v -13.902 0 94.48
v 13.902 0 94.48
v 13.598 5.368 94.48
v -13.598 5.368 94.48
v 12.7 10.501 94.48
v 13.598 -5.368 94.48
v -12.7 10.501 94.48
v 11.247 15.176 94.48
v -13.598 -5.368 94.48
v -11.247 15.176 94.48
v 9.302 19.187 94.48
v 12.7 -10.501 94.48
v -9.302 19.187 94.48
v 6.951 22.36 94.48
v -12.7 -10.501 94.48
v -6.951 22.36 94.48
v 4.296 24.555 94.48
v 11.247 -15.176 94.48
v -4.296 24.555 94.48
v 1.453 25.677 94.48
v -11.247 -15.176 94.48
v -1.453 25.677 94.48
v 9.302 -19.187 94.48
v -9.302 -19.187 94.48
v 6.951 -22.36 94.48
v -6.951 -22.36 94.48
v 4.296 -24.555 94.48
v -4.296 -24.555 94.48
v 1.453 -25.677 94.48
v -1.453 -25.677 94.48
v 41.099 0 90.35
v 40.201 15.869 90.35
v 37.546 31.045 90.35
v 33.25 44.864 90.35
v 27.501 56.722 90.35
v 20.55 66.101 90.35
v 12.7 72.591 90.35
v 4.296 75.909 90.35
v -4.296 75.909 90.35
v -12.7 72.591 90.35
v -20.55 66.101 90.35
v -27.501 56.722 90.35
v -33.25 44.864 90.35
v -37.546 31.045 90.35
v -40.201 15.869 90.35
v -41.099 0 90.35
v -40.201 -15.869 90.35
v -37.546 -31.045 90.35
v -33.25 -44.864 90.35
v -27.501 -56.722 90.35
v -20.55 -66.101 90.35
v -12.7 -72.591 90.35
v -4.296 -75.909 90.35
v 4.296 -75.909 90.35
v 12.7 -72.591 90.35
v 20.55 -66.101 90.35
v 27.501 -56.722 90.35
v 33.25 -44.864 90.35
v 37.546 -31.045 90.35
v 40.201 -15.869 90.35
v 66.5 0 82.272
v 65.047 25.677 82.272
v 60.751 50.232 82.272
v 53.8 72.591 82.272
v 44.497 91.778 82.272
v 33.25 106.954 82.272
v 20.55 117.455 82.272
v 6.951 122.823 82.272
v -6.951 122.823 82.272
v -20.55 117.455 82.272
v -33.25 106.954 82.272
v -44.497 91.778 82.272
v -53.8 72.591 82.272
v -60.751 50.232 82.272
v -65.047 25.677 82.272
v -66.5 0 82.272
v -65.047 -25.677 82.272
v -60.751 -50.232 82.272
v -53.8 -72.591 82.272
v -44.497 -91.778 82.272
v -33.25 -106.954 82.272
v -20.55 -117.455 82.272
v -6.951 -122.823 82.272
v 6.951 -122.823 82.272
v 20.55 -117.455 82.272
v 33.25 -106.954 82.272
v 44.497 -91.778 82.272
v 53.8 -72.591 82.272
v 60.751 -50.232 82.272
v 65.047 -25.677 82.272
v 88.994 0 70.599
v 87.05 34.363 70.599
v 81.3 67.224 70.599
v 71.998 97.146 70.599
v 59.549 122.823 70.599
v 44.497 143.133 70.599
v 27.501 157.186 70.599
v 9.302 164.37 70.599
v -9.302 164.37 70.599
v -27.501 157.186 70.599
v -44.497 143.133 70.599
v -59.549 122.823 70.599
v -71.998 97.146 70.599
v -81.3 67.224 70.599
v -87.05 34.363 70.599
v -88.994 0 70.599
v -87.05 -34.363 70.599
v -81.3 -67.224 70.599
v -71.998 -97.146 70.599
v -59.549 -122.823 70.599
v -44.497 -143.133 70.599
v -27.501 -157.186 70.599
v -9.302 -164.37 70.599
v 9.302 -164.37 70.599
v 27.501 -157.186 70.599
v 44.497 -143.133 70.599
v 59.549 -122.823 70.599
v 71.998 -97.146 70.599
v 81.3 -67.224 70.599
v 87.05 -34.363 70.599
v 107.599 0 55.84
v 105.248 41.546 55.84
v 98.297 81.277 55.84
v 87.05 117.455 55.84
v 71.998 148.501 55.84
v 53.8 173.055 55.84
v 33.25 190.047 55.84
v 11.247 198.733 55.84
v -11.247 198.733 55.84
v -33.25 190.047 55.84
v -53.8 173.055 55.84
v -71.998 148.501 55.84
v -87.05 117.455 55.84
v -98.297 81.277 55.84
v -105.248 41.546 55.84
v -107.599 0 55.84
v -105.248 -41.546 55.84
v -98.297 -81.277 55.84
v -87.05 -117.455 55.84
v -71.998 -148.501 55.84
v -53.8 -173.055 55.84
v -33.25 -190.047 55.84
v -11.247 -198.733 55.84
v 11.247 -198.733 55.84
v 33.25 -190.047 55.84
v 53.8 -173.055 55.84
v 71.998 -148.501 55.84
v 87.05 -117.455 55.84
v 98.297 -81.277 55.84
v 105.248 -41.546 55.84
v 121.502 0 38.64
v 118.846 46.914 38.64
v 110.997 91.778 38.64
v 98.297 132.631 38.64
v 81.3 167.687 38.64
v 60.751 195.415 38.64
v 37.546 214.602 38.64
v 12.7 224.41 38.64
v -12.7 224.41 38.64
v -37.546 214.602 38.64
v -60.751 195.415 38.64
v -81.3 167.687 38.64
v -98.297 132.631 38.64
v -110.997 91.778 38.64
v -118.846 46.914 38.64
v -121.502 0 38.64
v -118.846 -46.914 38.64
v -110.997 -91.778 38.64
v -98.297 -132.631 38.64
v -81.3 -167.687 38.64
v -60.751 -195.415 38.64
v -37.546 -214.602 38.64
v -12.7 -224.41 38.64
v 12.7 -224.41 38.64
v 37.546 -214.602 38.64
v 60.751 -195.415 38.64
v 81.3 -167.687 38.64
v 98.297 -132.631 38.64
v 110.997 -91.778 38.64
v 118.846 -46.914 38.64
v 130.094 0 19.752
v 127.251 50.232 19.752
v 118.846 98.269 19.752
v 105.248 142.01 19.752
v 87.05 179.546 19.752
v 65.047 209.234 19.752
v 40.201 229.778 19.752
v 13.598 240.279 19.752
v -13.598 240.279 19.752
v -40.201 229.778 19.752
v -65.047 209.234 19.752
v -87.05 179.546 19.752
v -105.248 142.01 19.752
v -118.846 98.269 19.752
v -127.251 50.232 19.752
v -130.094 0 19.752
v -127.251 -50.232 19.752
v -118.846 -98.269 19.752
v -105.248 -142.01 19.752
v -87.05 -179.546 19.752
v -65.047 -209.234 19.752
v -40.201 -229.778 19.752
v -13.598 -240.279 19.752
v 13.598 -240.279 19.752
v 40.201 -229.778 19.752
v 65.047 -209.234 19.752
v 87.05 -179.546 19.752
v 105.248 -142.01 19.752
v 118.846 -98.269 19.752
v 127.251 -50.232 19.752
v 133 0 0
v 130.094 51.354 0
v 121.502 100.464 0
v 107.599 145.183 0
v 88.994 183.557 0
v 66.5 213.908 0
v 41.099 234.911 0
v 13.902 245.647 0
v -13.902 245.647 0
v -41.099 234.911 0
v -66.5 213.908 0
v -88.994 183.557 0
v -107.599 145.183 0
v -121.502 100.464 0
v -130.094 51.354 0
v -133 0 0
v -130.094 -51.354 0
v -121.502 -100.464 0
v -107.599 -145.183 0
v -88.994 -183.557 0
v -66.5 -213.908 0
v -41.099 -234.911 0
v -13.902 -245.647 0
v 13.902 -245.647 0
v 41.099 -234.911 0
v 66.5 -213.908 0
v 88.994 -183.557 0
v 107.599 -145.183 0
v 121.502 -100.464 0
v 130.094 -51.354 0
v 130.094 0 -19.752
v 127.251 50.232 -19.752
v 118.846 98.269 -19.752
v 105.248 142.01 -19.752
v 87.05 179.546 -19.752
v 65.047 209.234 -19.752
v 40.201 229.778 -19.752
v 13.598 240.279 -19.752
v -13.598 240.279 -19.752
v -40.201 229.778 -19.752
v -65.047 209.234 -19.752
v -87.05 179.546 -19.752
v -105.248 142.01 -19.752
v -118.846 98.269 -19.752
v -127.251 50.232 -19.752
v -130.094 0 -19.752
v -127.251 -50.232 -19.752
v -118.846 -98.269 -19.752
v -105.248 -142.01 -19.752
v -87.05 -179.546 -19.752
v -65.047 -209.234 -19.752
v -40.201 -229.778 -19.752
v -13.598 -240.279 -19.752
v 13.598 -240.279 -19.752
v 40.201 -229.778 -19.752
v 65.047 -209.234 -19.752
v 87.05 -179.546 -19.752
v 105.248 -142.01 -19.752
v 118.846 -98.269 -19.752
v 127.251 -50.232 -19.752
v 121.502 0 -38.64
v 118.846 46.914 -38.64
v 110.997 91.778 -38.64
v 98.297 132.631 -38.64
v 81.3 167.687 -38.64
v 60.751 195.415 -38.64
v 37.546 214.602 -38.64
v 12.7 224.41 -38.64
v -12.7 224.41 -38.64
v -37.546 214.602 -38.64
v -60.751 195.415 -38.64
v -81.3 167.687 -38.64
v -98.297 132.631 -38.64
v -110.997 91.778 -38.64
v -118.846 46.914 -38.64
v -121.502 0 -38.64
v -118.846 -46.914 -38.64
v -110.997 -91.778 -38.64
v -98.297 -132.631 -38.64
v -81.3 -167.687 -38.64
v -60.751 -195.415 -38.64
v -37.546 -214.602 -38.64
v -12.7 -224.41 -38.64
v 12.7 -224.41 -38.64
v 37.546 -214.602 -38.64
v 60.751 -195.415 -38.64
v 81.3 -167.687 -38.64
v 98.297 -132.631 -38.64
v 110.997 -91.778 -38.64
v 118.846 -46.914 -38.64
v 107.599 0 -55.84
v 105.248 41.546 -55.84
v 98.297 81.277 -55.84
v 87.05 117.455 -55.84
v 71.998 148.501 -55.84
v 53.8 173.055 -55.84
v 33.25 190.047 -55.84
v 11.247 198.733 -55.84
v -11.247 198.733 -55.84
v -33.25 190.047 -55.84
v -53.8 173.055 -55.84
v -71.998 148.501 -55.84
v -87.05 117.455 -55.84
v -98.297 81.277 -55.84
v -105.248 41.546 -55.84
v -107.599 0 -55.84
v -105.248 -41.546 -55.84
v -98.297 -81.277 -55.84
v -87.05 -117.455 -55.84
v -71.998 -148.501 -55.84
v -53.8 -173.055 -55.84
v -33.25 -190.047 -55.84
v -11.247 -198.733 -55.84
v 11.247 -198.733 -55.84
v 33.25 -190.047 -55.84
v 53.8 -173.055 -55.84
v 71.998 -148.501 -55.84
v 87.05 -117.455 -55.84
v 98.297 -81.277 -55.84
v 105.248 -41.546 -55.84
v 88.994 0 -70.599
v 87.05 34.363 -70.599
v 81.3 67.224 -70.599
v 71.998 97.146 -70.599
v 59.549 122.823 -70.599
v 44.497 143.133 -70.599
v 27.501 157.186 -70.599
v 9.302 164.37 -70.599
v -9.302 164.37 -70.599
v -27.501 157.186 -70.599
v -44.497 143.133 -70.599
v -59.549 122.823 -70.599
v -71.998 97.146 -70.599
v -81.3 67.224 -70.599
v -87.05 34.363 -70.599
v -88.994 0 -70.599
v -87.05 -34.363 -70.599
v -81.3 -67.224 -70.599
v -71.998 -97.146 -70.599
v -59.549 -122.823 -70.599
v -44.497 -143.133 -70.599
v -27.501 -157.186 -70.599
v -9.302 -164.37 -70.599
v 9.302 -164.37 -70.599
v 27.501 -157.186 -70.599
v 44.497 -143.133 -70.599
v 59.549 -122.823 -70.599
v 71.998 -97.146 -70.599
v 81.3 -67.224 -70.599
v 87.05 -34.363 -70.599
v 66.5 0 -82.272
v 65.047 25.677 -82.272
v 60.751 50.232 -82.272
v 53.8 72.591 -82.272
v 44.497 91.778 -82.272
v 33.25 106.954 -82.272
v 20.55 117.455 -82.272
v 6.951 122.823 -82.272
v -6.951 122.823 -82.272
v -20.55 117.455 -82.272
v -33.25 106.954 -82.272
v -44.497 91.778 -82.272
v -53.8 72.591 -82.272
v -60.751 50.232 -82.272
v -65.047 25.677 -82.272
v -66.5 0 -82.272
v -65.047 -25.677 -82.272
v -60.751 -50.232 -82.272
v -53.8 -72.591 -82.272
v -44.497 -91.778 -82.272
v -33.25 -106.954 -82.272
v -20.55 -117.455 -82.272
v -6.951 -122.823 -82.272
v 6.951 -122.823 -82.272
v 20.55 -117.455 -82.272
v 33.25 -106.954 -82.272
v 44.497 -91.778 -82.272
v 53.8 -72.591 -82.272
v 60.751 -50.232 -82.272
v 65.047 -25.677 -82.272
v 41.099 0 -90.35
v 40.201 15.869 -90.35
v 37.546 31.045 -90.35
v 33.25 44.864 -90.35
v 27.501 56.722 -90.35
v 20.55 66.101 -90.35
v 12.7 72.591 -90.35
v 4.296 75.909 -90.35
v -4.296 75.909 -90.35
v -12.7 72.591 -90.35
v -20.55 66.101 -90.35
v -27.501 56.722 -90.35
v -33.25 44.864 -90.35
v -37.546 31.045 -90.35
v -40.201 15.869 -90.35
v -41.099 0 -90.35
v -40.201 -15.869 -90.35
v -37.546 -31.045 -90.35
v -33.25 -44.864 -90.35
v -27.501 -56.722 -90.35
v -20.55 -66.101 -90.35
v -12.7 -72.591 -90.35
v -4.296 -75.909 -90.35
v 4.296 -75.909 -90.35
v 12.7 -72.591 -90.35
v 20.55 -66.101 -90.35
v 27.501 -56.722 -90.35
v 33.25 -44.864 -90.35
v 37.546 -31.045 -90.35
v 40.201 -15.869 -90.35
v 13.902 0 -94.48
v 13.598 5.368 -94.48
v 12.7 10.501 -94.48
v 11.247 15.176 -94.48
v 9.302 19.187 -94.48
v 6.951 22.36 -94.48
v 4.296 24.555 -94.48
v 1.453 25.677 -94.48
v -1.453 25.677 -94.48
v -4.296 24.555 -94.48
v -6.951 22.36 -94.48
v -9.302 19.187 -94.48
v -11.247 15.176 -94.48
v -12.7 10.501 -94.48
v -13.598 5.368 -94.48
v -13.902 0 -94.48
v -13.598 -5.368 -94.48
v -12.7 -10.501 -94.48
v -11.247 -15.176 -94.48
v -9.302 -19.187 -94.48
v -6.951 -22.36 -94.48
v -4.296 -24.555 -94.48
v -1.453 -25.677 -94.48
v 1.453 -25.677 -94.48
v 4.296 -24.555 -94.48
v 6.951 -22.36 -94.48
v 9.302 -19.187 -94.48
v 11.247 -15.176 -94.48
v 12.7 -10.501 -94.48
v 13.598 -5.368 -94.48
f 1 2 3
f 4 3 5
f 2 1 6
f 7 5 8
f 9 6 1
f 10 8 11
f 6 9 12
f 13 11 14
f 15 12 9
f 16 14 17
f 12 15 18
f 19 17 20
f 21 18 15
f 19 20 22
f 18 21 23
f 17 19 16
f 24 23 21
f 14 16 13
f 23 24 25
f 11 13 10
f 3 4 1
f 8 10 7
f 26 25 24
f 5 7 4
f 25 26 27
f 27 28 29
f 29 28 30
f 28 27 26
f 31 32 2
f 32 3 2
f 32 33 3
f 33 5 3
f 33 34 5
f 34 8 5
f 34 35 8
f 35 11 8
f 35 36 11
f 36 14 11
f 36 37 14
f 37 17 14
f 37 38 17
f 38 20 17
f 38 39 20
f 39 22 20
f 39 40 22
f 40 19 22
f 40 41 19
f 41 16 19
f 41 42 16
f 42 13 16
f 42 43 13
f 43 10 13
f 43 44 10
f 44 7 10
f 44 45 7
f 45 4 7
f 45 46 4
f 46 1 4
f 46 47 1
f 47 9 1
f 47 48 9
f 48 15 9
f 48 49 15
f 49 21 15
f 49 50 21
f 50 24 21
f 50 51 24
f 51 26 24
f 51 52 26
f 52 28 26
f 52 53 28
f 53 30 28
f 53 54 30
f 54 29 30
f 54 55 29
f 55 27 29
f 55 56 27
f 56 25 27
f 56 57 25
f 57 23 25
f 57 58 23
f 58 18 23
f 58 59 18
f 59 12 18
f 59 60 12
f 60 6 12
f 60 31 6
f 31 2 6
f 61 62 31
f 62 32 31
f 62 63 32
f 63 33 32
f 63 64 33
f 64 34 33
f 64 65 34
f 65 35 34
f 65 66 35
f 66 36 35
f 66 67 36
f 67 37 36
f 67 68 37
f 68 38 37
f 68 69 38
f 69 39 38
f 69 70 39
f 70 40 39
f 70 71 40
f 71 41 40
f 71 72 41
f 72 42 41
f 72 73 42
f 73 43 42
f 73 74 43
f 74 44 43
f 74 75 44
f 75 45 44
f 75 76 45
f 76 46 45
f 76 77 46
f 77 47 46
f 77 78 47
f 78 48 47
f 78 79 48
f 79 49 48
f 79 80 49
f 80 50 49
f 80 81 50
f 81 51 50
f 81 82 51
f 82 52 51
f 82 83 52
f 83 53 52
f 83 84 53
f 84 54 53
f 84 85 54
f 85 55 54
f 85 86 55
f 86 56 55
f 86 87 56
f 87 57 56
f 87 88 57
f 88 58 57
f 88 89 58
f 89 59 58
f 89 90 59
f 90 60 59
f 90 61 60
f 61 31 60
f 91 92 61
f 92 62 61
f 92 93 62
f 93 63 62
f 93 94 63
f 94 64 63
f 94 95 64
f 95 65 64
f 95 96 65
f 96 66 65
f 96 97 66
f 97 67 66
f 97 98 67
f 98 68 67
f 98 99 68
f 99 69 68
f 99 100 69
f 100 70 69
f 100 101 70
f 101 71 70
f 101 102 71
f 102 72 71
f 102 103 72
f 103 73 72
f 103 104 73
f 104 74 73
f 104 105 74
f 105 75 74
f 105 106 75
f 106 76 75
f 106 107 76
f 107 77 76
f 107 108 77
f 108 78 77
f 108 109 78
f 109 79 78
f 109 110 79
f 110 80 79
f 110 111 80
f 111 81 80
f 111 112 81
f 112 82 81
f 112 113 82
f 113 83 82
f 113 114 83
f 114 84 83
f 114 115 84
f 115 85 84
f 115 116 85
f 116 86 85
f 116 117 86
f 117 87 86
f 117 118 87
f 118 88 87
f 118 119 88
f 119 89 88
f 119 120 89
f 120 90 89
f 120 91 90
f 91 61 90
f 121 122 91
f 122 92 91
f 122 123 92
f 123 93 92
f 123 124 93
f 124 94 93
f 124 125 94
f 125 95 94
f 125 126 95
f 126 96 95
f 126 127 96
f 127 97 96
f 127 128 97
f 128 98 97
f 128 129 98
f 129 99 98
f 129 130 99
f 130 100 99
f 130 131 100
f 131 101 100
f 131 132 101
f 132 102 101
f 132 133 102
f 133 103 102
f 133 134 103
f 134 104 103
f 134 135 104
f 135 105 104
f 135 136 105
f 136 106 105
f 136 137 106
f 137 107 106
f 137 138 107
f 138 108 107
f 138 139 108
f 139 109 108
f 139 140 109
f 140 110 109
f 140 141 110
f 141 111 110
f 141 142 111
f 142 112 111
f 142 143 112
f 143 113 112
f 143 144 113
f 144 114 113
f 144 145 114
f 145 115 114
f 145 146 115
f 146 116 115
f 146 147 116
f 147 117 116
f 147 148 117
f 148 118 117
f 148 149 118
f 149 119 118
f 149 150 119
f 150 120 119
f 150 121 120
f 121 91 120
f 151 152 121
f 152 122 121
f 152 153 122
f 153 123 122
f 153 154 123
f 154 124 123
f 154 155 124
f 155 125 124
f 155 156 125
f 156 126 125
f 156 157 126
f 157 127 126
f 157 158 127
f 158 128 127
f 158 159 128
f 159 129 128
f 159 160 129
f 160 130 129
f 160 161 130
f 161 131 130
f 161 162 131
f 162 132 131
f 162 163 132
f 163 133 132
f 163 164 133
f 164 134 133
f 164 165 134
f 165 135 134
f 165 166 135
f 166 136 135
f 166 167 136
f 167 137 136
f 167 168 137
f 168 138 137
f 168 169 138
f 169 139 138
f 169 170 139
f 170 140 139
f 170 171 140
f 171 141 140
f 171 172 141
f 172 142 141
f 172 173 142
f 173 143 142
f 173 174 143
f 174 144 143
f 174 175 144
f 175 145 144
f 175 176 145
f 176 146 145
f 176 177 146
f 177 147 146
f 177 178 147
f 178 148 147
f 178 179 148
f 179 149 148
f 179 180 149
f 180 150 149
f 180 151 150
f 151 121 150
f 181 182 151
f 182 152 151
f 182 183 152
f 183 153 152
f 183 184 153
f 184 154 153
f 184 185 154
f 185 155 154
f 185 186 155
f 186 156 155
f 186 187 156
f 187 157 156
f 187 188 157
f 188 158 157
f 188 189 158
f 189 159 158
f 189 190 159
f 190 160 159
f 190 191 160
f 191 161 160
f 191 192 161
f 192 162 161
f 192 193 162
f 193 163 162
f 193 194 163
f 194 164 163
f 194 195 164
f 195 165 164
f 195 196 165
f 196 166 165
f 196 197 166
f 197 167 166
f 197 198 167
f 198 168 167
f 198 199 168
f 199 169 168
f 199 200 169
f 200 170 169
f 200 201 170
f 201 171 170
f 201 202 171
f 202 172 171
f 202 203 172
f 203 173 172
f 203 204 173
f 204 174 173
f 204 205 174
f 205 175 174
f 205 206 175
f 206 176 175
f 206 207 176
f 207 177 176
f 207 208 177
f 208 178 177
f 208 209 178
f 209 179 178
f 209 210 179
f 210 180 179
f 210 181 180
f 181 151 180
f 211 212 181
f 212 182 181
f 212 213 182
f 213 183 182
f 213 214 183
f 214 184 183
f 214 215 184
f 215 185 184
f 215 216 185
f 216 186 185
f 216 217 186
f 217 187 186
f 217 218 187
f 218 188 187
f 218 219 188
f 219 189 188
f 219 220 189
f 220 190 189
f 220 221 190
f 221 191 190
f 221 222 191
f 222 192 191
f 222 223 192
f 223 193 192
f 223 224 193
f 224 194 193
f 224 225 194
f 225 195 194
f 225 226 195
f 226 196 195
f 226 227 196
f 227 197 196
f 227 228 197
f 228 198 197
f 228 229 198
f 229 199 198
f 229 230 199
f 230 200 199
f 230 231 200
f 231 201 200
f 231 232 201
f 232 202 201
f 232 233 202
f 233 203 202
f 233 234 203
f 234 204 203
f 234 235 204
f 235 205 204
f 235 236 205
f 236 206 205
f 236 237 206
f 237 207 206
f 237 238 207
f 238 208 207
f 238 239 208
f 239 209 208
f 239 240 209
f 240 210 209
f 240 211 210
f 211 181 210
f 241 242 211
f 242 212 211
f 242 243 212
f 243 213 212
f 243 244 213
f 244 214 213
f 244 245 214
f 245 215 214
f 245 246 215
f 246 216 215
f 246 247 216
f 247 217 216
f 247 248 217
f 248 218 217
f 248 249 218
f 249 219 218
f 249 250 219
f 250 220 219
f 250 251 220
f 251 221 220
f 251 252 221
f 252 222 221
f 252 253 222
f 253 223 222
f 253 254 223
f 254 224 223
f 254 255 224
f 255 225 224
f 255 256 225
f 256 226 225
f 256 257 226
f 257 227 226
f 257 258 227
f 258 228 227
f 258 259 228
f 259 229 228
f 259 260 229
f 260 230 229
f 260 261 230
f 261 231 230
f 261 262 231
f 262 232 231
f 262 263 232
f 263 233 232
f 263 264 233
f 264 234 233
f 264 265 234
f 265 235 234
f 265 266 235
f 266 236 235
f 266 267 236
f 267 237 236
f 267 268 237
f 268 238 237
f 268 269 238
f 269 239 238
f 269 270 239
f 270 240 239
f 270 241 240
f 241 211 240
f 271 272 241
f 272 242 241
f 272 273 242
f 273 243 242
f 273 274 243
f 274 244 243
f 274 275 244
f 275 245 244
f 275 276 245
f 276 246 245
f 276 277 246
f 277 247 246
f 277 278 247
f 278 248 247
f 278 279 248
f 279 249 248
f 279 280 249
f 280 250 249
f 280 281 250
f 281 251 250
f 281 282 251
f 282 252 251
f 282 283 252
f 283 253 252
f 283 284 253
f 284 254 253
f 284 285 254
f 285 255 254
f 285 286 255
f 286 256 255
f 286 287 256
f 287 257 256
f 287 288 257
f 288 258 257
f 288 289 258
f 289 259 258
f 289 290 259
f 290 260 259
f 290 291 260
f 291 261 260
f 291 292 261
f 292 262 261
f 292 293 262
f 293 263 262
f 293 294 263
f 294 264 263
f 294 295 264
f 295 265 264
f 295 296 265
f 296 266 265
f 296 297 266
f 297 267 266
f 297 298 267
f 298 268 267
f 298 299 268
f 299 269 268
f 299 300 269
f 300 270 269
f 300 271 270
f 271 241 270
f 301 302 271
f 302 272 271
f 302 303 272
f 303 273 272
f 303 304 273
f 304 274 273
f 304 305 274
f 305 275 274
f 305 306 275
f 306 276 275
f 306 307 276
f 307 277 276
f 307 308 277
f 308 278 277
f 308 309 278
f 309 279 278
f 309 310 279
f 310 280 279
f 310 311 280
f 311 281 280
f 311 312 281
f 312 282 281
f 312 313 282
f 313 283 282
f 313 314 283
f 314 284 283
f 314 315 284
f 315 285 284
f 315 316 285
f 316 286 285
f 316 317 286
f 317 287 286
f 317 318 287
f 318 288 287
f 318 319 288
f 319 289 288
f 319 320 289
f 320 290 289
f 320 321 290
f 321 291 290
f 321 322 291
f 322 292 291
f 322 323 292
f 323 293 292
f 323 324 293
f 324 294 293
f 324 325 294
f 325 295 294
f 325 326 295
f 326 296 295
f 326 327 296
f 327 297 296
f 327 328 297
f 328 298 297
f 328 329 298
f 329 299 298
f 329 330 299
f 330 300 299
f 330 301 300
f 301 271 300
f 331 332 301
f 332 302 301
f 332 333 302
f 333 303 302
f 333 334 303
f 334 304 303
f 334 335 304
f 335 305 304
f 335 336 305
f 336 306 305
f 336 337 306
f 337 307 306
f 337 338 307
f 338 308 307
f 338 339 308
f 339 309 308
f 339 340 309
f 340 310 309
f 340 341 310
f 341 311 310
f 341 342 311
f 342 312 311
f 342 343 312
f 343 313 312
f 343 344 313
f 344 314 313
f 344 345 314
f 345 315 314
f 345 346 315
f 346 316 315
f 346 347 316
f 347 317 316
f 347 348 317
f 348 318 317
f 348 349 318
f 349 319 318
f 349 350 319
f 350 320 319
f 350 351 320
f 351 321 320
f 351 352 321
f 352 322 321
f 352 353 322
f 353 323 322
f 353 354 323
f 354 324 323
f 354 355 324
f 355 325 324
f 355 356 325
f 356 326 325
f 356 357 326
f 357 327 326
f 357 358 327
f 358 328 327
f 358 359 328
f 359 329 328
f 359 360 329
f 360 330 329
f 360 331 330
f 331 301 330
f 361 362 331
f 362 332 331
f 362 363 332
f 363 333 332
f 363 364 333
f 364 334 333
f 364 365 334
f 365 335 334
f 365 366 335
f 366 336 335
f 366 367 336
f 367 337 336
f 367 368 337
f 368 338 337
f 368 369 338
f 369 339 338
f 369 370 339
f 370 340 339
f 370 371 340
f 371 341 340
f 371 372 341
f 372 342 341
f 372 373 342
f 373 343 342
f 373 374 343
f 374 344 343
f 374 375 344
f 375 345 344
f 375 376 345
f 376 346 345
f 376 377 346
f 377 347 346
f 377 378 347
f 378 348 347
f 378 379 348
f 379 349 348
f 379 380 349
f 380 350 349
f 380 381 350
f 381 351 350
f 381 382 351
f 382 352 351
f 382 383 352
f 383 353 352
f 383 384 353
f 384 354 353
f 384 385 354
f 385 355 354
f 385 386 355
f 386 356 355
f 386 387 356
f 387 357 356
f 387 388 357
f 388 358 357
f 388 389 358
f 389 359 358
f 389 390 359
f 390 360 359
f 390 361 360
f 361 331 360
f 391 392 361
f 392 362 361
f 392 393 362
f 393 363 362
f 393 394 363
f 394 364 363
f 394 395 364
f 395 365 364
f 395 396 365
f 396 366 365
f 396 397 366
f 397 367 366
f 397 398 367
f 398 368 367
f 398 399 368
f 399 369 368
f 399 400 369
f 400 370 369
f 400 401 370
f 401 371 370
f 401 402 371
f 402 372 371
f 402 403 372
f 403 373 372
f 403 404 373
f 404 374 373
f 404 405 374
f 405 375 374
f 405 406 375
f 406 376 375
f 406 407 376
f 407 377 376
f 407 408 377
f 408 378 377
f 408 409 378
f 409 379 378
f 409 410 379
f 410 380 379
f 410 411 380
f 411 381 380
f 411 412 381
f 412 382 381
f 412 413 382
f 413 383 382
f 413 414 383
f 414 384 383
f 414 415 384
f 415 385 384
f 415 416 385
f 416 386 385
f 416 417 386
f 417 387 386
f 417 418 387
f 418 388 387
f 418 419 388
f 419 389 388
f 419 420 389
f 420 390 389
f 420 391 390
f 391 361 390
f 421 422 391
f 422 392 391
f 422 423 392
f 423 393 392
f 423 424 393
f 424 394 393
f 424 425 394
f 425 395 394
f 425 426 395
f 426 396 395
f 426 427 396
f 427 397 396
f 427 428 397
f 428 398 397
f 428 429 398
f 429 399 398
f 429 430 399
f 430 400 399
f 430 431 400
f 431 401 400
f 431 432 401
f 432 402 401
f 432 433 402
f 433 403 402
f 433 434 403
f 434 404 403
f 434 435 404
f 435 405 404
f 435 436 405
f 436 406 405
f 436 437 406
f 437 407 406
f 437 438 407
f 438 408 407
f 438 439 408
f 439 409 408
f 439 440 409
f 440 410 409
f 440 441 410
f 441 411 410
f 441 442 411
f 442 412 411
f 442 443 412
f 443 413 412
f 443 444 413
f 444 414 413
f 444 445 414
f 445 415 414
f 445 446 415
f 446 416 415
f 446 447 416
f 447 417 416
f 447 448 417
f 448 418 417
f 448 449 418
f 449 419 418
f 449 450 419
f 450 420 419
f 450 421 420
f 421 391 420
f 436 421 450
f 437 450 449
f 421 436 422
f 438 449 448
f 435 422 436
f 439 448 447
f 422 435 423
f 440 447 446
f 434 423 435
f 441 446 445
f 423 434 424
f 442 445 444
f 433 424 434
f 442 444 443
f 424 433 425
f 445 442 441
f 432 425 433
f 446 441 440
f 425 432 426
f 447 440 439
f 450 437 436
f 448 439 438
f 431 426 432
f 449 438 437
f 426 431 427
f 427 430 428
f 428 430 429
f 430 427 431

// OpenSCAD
// Generated by SolidPython 1.0.1 on 2020-07-29 00:46:47


scale(v = [7, 13, 5]) {
	sphere(r = 19);
}
/***********************************************
*********      SolidPython code:      **********
************************************************
 
# import packages: SolidPython
from solid import *
from solid.utils import *
from itertools import chain, combinations, permutations


class Resize:

    def __init__(self, scad_file):
        self.scad_file = scad_file
        #self.scad_file = import_scad(scad_file)
        # cone/cylinder param:
        self.r1 = 0
        self.r2 = 0
        self.h = 0
        # rectangular prism param:
        self.w = 0
        self.l = 0
        # ellipse param:
        self.r = 0

    # import OpenScad code (file name corresponds to shape)


    # classify shape + parameters
    def assign(self, param1, param2, param3):
        if self.scad_file == 'cone.scad':
            self.r1 = param1
            self.r2 = param2
            self.h = param3
        elif self.scad_file == 'cylinder.scad':
            self.r1 = param1
            self.r2 = param2
            self.h = param3
        elif self.scad_file == 'rectangularPrism.scad':
            self.h = param1
            self.l = param2
            self.w = param3
        else:
            self.r = param1
            self.h = param2

    # resize parameters
    def iterate(self):
        x = range(3, 20, 2)
        i = 1
        if self.scad_file == 'cone.scad':
            tempList = list(permutations(x, 2))
            for temp in tempList:
                param1 = temp[0]
                param2 = temp[1]
                filepath = 'produced_scad_files/' + 'cone' + str(param1) + '_' + str(param2) + '_' + '.scad'
                scad_render_to_file(cylinder(h=param1, r1=param2, r2=0), filepath)

        elif self.scad_file == 'cylinder.scad':
            tempList = list(permutations(x, 3))
            for temp in tempList:
                param1 = temp[0]
                param2 = temp[1]
                filepath = 'produced_scad_files/' + 'cylinder' + str(param1) + '_' + str(param2) + '_' + '.scad'
                scad_render_to_file(cylinder(h=param1, r1=param2, r2=param2), filepath)

        elif self.scad_file == 'rectangularPrism.scad':
            tempList = list(permutations(x, 3))
            for temp in tempList:
                param1 = temp[0]
                param2 = temp[1]
                param3 = temp[2]
                filepath = 'produced_scad_files/' + 'rectangularPrism' + str(param1) + '_' + str(param2) + '_' + str(
                    param3) + '.scad'
                scad_render_to_file(cube(size=(param1, param2, param3)), filepath)

        elif self.scad_file == 'ellipse.scad':
            tempList = list(permutations(x, 4))
            for temp in tempList:
                param1 = temp[0]
                param2 = temp[1]
                param3 = temp[2]
                param4 = temp[3]
                filepath = 'produced_scad_files/' + 'ellipse' + str(param1) + '_' + str(param2) + '_' + str(param3) + '_' + str(param4) + '.scad'
                scad_render_to_file(scale([param1, param2, param3])(sphere(r=param4)), filepath)

    def render_to_scadfile(self):
        scad_render_to_file(scad, 'example.scad') 
 
************************************************/
